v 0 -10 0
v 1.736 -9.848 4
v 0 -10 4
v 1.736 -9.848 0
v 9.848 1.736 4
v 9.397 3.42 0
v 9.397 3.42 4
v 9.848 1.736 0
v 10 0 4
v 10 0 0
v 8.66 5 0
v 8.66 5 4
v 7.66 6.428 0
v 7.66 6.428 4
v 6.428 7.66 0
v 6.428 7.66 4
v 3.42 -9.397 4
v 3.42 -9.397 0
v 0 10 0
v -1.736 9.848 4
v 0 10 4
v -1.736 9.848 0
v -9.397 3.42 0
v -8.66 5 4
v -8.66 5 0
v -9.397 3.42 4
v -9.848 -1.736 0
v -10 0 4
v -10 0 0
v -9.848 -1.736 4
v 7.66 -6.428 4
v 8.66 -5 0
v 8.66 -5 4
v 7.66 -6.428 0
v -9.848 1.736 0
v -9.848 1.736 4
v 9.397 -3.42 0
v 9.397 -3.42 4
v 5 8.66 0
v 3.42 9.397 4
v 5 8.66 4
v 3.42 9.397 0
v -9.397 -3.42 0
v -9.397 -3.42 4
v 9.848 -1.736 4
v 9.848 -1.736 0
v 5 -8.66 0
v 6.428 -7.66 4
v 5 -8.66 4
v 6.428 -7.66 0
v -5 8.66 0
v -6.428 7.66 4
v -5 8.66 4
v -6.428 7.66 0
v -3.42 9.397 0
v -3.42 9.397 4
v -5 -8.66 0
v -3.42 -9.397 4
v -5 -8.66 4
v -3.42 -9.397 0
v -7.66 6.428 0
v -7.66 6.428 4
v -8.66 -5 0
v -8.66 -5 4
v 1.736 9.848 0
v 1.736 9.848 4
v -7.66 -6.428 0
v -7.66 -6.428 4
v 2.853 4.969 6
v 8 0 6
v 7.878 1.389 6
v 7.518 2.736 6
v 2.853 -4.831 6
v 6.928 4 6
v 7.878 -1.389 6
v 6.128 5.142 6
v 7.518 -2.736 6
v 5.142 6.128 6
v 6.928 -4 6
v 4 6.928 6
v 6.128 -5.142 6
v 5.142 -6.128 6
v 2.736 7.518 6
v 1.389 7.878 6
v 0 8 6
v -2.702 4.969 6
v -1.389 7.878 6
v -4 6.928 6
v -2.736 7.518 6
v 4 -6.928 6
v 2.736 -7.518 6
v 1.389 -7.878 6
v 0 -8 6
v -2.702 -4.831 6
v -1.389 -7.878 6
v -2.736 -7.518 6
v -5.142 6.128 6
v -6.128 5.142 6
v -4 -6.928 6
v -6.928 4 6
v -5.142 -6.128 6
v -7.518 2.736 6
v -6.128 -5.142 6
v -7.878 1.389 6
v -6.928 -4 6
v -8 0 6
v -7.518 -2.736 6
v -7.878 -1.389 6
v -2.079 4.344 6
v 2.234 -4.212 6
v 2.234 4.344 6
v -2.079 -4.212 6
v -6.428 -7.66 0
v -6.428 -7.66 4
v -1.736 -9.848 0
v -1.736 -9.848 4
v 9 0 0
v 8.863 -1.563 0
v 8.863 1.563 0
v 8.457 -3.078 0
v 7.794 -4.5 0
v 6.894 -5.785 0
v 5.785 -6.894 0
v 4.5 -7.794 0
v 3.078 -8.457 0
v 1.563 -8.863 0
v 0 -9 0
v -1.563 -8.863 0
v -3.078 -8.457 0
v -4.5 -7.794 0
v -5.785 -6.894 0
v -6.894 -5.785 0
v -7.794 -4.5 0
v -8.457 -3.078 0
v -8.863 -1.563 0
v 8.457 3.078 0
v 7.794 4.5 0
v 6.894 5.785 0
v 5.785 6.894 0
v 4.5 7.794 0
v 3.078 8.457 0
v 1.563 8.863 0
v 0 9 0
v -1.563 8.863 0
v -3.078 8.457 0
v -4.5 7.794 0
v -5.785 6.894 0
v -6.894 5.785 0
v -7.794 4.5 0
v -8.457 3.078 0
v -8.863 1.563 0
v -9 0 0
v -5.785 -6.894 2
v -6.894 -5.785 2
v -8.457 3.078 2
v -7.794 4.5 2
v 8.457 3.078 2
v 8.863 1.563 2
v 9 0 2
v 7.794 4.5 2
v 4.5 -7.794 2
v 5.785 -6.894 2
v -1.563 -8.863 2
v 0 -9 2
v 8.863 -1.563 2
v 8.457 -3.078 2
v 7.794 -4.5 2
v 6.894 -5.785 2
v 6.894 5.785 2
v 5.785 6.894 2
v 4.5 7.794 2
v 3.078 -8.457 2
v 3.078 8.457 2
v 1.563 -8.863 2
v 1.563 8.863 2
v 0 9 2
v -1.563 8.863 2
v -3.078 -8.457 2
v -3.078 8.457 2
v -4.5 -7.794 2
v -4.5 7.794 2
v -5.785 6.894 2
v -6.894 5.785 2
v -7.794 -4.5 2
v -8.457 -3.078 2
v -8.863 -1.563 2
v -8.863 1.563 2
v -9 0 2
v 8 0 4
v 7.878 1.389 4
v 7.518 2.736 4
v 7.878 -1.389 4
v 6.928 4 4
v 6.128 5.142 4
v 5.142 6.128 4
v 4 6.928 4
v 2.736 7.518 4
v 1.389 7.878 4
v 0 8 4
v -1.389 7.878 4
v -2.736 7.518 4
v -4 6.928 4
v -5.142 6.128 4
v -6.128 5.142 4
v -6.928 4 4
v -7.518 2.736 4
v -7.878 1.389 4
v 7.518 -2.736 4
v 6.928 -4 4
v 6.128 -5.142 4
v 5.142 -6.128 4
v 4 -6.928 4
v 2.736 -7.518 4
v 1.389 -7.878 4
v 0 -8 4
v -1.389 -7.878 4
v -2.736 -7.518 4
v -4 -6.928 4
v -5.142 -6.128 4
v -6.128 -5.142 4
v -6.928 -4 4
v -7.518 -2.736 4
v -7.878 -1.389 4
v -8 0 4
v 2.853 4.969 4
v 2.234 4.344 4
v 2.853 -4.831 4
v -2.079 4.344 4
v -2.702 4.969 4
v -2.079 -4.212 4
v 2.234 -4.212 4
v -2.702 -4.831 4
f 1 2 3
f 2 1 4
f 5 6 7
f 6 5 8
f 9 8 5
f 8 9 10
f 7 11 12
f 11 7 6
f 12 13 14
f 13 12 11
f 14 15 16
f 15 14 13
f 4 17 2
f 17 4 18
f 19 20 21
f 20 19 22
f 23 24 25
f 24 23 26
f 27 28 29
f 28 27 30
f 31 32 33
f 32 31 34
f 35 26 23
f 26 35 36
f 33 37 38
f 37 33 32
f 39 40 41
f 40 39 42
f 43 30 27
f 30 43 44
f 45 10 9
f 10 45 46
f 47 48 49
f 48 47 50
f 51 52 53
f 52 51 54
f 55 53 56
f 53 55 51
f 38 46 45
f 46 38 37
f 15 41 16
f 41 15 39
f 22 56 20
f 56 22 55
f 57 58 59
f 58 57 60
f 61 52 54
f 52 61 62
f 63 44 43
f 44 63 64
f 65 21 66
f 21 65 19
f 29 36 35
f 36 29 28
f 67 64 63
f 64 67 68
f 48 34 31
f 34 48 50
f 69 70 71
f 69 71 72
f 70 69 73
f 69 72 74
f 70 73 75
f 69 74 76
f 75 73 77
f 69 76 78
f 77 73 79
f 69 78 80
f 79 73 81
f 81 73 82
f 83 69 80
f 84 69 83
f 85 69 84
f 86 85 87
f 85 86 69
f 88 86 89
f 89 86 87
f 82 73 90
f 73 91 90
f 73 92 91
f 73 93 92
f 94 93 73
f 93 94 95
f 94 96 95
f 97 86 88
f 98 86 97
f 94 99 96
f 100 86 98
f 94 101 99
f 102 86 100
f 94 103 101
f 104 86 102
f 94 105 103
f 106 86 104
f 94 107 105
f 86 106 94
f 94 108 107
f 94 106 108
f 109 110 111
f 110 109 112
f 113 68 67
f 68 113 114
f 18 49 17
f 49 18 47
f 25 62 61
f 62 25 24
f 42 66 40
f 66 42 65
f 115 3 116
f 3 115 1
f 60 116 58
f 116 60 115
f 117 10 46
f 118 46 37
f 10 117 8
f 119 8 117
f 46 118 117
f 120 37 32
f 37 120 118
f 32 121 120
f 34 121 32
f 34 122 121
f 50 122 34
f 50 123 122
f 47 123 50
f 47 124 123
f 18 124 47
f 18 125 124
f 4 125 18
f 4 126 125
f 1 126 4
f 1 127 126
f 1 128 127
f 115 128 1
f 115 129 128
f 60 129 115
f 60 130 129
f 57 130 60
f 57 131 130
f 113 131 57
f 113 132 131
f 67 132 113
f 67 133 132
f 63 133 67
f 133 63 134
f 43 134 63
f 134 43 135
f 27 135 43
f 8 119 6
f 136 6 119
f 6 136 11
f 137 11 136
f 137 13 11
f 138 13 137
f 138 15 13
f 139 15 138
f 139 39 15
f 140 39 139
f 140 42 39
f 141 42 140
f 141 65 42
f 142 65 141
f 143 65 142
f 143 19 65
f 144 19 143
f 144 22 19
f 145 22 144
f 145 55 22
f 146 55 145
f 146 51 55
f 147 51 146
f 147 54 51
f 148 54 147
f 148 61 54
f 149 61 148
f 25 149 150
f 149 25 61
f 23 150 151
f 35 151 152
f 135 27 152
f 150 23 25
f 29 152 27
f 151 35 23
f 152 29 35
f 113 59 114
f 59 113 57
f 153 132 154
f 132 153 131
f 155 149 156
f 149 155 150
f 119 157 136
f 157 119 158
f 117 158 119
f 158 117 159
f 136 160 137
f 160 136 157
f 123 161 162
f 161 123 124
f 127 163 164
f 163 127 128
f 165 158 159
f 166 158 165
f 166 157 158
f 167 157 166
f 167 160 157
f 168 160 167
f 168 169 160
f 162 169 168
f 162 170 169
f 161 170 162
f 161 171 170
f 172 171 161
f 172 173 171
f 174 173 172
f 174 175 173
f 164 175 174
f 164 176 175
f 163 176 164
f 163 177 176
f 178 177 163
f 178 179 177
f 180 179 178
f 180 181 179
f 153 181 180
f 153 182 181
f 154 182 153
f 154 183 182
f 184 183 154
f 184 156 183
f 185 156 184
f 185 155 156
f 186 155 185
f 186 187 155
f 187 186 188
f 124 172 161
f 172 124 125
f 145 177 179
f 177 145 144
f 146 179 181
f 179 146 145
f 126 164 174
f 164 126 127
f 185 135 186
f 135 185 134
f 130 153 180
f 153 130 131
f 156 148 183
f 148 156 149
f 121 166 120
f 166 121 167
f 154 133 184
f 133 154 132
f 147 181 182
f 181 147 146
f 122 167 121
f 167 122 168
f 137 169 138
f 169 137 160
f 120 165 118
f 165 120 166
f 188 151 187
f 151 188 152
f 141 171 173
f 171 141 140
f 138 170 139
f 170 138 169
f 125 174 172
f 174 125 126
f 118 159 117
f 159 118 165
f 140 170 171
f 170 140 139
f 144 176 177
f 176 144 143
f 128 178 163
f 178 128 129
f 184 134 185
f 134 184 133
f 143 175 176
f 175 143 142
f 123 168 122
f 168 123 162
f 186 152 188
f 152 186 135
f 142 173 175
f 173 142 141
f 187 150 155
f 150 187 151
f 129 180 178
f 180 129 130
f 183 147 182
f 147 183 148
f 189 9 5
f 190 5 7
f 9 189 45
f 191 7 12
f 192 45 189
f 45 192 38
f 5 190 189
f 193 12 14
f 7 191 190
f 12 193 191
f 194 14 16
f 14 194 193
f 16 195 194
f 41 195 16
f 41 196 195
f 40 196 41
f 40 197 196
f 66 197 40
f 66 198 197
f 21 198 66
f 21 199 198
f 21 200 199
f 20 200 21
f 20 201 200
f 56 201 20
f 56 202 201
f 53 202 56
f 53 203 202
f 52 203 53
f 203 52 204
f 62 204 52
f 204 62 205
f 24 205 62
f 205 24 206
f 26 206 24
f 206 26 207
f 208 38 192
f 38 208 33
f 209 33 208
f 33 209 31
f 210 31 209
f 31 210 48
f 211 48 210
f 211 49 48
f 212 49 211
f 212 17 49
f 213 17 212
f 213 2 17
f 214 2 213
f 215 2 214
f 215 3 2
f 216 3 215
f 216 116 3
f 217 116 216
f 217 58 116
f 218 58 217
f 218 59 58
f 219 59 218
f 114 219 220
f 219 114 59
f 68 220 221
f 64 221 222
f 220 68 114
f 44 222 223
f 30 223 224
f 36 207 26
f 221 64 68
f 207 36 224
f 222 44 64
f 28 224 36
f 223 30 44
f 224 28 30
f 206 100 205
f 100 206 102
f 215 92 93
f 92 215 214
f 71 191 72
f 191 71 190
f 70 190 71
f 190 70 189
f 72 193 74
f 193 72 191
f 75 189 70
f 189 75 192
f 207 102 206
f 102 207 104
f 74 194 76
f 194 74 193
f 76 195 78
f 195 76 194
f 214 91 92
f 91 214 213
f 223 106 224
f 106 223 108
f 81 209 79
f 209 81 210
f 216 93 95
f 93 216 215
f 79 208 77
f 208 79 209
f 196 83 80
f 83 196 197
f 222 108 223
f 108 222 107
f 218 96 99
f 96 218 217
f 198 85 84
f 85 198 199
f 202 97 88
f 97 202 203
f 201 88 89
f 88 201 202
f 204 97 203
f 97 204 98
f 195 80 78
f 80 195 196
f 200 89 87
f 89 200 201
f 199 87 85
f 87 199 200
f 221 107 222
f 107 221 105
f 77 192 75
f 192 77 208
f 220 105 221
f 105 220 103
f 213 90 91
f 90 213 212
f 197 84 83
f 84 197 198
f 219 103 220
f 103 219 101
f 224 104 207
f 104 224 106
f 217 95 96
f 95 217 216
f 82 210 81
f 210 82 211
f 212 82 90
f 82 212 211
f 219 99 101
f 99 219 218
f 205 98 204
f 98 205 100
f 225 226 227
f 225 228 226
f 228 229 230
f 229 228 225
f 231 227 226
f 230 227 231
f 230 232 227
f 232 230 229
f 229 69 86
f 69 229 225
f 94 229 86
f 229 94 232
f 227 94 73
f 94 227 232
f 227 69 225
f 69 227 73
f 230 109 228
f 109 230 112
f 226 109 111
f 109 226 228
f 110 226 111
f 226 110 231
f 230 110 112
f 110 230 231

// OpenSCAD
difference() {
	difference() {
		difference() {
			cylinder($fn = 36, h = 6, r = 10);
			translate(v = [0, 0, -1]) {
				cylinder($fn = 36, h = 3, r = 9);
			}
		}
		translate(v = [0, 0, 4]) {
			difference() {
				cylinder($fn = 36, h = 3, r = 10.5000000000);
				cylinder($fn = 36, h = 3, r = 8);
			}
		}
	}
	translate(v = [0, 0, 4]) {
		linear_extrude(height = 3) {
			text(font = "mana", halign = "center", size = 8, text = "\uE618", valign = "center");
		}
	}
}
